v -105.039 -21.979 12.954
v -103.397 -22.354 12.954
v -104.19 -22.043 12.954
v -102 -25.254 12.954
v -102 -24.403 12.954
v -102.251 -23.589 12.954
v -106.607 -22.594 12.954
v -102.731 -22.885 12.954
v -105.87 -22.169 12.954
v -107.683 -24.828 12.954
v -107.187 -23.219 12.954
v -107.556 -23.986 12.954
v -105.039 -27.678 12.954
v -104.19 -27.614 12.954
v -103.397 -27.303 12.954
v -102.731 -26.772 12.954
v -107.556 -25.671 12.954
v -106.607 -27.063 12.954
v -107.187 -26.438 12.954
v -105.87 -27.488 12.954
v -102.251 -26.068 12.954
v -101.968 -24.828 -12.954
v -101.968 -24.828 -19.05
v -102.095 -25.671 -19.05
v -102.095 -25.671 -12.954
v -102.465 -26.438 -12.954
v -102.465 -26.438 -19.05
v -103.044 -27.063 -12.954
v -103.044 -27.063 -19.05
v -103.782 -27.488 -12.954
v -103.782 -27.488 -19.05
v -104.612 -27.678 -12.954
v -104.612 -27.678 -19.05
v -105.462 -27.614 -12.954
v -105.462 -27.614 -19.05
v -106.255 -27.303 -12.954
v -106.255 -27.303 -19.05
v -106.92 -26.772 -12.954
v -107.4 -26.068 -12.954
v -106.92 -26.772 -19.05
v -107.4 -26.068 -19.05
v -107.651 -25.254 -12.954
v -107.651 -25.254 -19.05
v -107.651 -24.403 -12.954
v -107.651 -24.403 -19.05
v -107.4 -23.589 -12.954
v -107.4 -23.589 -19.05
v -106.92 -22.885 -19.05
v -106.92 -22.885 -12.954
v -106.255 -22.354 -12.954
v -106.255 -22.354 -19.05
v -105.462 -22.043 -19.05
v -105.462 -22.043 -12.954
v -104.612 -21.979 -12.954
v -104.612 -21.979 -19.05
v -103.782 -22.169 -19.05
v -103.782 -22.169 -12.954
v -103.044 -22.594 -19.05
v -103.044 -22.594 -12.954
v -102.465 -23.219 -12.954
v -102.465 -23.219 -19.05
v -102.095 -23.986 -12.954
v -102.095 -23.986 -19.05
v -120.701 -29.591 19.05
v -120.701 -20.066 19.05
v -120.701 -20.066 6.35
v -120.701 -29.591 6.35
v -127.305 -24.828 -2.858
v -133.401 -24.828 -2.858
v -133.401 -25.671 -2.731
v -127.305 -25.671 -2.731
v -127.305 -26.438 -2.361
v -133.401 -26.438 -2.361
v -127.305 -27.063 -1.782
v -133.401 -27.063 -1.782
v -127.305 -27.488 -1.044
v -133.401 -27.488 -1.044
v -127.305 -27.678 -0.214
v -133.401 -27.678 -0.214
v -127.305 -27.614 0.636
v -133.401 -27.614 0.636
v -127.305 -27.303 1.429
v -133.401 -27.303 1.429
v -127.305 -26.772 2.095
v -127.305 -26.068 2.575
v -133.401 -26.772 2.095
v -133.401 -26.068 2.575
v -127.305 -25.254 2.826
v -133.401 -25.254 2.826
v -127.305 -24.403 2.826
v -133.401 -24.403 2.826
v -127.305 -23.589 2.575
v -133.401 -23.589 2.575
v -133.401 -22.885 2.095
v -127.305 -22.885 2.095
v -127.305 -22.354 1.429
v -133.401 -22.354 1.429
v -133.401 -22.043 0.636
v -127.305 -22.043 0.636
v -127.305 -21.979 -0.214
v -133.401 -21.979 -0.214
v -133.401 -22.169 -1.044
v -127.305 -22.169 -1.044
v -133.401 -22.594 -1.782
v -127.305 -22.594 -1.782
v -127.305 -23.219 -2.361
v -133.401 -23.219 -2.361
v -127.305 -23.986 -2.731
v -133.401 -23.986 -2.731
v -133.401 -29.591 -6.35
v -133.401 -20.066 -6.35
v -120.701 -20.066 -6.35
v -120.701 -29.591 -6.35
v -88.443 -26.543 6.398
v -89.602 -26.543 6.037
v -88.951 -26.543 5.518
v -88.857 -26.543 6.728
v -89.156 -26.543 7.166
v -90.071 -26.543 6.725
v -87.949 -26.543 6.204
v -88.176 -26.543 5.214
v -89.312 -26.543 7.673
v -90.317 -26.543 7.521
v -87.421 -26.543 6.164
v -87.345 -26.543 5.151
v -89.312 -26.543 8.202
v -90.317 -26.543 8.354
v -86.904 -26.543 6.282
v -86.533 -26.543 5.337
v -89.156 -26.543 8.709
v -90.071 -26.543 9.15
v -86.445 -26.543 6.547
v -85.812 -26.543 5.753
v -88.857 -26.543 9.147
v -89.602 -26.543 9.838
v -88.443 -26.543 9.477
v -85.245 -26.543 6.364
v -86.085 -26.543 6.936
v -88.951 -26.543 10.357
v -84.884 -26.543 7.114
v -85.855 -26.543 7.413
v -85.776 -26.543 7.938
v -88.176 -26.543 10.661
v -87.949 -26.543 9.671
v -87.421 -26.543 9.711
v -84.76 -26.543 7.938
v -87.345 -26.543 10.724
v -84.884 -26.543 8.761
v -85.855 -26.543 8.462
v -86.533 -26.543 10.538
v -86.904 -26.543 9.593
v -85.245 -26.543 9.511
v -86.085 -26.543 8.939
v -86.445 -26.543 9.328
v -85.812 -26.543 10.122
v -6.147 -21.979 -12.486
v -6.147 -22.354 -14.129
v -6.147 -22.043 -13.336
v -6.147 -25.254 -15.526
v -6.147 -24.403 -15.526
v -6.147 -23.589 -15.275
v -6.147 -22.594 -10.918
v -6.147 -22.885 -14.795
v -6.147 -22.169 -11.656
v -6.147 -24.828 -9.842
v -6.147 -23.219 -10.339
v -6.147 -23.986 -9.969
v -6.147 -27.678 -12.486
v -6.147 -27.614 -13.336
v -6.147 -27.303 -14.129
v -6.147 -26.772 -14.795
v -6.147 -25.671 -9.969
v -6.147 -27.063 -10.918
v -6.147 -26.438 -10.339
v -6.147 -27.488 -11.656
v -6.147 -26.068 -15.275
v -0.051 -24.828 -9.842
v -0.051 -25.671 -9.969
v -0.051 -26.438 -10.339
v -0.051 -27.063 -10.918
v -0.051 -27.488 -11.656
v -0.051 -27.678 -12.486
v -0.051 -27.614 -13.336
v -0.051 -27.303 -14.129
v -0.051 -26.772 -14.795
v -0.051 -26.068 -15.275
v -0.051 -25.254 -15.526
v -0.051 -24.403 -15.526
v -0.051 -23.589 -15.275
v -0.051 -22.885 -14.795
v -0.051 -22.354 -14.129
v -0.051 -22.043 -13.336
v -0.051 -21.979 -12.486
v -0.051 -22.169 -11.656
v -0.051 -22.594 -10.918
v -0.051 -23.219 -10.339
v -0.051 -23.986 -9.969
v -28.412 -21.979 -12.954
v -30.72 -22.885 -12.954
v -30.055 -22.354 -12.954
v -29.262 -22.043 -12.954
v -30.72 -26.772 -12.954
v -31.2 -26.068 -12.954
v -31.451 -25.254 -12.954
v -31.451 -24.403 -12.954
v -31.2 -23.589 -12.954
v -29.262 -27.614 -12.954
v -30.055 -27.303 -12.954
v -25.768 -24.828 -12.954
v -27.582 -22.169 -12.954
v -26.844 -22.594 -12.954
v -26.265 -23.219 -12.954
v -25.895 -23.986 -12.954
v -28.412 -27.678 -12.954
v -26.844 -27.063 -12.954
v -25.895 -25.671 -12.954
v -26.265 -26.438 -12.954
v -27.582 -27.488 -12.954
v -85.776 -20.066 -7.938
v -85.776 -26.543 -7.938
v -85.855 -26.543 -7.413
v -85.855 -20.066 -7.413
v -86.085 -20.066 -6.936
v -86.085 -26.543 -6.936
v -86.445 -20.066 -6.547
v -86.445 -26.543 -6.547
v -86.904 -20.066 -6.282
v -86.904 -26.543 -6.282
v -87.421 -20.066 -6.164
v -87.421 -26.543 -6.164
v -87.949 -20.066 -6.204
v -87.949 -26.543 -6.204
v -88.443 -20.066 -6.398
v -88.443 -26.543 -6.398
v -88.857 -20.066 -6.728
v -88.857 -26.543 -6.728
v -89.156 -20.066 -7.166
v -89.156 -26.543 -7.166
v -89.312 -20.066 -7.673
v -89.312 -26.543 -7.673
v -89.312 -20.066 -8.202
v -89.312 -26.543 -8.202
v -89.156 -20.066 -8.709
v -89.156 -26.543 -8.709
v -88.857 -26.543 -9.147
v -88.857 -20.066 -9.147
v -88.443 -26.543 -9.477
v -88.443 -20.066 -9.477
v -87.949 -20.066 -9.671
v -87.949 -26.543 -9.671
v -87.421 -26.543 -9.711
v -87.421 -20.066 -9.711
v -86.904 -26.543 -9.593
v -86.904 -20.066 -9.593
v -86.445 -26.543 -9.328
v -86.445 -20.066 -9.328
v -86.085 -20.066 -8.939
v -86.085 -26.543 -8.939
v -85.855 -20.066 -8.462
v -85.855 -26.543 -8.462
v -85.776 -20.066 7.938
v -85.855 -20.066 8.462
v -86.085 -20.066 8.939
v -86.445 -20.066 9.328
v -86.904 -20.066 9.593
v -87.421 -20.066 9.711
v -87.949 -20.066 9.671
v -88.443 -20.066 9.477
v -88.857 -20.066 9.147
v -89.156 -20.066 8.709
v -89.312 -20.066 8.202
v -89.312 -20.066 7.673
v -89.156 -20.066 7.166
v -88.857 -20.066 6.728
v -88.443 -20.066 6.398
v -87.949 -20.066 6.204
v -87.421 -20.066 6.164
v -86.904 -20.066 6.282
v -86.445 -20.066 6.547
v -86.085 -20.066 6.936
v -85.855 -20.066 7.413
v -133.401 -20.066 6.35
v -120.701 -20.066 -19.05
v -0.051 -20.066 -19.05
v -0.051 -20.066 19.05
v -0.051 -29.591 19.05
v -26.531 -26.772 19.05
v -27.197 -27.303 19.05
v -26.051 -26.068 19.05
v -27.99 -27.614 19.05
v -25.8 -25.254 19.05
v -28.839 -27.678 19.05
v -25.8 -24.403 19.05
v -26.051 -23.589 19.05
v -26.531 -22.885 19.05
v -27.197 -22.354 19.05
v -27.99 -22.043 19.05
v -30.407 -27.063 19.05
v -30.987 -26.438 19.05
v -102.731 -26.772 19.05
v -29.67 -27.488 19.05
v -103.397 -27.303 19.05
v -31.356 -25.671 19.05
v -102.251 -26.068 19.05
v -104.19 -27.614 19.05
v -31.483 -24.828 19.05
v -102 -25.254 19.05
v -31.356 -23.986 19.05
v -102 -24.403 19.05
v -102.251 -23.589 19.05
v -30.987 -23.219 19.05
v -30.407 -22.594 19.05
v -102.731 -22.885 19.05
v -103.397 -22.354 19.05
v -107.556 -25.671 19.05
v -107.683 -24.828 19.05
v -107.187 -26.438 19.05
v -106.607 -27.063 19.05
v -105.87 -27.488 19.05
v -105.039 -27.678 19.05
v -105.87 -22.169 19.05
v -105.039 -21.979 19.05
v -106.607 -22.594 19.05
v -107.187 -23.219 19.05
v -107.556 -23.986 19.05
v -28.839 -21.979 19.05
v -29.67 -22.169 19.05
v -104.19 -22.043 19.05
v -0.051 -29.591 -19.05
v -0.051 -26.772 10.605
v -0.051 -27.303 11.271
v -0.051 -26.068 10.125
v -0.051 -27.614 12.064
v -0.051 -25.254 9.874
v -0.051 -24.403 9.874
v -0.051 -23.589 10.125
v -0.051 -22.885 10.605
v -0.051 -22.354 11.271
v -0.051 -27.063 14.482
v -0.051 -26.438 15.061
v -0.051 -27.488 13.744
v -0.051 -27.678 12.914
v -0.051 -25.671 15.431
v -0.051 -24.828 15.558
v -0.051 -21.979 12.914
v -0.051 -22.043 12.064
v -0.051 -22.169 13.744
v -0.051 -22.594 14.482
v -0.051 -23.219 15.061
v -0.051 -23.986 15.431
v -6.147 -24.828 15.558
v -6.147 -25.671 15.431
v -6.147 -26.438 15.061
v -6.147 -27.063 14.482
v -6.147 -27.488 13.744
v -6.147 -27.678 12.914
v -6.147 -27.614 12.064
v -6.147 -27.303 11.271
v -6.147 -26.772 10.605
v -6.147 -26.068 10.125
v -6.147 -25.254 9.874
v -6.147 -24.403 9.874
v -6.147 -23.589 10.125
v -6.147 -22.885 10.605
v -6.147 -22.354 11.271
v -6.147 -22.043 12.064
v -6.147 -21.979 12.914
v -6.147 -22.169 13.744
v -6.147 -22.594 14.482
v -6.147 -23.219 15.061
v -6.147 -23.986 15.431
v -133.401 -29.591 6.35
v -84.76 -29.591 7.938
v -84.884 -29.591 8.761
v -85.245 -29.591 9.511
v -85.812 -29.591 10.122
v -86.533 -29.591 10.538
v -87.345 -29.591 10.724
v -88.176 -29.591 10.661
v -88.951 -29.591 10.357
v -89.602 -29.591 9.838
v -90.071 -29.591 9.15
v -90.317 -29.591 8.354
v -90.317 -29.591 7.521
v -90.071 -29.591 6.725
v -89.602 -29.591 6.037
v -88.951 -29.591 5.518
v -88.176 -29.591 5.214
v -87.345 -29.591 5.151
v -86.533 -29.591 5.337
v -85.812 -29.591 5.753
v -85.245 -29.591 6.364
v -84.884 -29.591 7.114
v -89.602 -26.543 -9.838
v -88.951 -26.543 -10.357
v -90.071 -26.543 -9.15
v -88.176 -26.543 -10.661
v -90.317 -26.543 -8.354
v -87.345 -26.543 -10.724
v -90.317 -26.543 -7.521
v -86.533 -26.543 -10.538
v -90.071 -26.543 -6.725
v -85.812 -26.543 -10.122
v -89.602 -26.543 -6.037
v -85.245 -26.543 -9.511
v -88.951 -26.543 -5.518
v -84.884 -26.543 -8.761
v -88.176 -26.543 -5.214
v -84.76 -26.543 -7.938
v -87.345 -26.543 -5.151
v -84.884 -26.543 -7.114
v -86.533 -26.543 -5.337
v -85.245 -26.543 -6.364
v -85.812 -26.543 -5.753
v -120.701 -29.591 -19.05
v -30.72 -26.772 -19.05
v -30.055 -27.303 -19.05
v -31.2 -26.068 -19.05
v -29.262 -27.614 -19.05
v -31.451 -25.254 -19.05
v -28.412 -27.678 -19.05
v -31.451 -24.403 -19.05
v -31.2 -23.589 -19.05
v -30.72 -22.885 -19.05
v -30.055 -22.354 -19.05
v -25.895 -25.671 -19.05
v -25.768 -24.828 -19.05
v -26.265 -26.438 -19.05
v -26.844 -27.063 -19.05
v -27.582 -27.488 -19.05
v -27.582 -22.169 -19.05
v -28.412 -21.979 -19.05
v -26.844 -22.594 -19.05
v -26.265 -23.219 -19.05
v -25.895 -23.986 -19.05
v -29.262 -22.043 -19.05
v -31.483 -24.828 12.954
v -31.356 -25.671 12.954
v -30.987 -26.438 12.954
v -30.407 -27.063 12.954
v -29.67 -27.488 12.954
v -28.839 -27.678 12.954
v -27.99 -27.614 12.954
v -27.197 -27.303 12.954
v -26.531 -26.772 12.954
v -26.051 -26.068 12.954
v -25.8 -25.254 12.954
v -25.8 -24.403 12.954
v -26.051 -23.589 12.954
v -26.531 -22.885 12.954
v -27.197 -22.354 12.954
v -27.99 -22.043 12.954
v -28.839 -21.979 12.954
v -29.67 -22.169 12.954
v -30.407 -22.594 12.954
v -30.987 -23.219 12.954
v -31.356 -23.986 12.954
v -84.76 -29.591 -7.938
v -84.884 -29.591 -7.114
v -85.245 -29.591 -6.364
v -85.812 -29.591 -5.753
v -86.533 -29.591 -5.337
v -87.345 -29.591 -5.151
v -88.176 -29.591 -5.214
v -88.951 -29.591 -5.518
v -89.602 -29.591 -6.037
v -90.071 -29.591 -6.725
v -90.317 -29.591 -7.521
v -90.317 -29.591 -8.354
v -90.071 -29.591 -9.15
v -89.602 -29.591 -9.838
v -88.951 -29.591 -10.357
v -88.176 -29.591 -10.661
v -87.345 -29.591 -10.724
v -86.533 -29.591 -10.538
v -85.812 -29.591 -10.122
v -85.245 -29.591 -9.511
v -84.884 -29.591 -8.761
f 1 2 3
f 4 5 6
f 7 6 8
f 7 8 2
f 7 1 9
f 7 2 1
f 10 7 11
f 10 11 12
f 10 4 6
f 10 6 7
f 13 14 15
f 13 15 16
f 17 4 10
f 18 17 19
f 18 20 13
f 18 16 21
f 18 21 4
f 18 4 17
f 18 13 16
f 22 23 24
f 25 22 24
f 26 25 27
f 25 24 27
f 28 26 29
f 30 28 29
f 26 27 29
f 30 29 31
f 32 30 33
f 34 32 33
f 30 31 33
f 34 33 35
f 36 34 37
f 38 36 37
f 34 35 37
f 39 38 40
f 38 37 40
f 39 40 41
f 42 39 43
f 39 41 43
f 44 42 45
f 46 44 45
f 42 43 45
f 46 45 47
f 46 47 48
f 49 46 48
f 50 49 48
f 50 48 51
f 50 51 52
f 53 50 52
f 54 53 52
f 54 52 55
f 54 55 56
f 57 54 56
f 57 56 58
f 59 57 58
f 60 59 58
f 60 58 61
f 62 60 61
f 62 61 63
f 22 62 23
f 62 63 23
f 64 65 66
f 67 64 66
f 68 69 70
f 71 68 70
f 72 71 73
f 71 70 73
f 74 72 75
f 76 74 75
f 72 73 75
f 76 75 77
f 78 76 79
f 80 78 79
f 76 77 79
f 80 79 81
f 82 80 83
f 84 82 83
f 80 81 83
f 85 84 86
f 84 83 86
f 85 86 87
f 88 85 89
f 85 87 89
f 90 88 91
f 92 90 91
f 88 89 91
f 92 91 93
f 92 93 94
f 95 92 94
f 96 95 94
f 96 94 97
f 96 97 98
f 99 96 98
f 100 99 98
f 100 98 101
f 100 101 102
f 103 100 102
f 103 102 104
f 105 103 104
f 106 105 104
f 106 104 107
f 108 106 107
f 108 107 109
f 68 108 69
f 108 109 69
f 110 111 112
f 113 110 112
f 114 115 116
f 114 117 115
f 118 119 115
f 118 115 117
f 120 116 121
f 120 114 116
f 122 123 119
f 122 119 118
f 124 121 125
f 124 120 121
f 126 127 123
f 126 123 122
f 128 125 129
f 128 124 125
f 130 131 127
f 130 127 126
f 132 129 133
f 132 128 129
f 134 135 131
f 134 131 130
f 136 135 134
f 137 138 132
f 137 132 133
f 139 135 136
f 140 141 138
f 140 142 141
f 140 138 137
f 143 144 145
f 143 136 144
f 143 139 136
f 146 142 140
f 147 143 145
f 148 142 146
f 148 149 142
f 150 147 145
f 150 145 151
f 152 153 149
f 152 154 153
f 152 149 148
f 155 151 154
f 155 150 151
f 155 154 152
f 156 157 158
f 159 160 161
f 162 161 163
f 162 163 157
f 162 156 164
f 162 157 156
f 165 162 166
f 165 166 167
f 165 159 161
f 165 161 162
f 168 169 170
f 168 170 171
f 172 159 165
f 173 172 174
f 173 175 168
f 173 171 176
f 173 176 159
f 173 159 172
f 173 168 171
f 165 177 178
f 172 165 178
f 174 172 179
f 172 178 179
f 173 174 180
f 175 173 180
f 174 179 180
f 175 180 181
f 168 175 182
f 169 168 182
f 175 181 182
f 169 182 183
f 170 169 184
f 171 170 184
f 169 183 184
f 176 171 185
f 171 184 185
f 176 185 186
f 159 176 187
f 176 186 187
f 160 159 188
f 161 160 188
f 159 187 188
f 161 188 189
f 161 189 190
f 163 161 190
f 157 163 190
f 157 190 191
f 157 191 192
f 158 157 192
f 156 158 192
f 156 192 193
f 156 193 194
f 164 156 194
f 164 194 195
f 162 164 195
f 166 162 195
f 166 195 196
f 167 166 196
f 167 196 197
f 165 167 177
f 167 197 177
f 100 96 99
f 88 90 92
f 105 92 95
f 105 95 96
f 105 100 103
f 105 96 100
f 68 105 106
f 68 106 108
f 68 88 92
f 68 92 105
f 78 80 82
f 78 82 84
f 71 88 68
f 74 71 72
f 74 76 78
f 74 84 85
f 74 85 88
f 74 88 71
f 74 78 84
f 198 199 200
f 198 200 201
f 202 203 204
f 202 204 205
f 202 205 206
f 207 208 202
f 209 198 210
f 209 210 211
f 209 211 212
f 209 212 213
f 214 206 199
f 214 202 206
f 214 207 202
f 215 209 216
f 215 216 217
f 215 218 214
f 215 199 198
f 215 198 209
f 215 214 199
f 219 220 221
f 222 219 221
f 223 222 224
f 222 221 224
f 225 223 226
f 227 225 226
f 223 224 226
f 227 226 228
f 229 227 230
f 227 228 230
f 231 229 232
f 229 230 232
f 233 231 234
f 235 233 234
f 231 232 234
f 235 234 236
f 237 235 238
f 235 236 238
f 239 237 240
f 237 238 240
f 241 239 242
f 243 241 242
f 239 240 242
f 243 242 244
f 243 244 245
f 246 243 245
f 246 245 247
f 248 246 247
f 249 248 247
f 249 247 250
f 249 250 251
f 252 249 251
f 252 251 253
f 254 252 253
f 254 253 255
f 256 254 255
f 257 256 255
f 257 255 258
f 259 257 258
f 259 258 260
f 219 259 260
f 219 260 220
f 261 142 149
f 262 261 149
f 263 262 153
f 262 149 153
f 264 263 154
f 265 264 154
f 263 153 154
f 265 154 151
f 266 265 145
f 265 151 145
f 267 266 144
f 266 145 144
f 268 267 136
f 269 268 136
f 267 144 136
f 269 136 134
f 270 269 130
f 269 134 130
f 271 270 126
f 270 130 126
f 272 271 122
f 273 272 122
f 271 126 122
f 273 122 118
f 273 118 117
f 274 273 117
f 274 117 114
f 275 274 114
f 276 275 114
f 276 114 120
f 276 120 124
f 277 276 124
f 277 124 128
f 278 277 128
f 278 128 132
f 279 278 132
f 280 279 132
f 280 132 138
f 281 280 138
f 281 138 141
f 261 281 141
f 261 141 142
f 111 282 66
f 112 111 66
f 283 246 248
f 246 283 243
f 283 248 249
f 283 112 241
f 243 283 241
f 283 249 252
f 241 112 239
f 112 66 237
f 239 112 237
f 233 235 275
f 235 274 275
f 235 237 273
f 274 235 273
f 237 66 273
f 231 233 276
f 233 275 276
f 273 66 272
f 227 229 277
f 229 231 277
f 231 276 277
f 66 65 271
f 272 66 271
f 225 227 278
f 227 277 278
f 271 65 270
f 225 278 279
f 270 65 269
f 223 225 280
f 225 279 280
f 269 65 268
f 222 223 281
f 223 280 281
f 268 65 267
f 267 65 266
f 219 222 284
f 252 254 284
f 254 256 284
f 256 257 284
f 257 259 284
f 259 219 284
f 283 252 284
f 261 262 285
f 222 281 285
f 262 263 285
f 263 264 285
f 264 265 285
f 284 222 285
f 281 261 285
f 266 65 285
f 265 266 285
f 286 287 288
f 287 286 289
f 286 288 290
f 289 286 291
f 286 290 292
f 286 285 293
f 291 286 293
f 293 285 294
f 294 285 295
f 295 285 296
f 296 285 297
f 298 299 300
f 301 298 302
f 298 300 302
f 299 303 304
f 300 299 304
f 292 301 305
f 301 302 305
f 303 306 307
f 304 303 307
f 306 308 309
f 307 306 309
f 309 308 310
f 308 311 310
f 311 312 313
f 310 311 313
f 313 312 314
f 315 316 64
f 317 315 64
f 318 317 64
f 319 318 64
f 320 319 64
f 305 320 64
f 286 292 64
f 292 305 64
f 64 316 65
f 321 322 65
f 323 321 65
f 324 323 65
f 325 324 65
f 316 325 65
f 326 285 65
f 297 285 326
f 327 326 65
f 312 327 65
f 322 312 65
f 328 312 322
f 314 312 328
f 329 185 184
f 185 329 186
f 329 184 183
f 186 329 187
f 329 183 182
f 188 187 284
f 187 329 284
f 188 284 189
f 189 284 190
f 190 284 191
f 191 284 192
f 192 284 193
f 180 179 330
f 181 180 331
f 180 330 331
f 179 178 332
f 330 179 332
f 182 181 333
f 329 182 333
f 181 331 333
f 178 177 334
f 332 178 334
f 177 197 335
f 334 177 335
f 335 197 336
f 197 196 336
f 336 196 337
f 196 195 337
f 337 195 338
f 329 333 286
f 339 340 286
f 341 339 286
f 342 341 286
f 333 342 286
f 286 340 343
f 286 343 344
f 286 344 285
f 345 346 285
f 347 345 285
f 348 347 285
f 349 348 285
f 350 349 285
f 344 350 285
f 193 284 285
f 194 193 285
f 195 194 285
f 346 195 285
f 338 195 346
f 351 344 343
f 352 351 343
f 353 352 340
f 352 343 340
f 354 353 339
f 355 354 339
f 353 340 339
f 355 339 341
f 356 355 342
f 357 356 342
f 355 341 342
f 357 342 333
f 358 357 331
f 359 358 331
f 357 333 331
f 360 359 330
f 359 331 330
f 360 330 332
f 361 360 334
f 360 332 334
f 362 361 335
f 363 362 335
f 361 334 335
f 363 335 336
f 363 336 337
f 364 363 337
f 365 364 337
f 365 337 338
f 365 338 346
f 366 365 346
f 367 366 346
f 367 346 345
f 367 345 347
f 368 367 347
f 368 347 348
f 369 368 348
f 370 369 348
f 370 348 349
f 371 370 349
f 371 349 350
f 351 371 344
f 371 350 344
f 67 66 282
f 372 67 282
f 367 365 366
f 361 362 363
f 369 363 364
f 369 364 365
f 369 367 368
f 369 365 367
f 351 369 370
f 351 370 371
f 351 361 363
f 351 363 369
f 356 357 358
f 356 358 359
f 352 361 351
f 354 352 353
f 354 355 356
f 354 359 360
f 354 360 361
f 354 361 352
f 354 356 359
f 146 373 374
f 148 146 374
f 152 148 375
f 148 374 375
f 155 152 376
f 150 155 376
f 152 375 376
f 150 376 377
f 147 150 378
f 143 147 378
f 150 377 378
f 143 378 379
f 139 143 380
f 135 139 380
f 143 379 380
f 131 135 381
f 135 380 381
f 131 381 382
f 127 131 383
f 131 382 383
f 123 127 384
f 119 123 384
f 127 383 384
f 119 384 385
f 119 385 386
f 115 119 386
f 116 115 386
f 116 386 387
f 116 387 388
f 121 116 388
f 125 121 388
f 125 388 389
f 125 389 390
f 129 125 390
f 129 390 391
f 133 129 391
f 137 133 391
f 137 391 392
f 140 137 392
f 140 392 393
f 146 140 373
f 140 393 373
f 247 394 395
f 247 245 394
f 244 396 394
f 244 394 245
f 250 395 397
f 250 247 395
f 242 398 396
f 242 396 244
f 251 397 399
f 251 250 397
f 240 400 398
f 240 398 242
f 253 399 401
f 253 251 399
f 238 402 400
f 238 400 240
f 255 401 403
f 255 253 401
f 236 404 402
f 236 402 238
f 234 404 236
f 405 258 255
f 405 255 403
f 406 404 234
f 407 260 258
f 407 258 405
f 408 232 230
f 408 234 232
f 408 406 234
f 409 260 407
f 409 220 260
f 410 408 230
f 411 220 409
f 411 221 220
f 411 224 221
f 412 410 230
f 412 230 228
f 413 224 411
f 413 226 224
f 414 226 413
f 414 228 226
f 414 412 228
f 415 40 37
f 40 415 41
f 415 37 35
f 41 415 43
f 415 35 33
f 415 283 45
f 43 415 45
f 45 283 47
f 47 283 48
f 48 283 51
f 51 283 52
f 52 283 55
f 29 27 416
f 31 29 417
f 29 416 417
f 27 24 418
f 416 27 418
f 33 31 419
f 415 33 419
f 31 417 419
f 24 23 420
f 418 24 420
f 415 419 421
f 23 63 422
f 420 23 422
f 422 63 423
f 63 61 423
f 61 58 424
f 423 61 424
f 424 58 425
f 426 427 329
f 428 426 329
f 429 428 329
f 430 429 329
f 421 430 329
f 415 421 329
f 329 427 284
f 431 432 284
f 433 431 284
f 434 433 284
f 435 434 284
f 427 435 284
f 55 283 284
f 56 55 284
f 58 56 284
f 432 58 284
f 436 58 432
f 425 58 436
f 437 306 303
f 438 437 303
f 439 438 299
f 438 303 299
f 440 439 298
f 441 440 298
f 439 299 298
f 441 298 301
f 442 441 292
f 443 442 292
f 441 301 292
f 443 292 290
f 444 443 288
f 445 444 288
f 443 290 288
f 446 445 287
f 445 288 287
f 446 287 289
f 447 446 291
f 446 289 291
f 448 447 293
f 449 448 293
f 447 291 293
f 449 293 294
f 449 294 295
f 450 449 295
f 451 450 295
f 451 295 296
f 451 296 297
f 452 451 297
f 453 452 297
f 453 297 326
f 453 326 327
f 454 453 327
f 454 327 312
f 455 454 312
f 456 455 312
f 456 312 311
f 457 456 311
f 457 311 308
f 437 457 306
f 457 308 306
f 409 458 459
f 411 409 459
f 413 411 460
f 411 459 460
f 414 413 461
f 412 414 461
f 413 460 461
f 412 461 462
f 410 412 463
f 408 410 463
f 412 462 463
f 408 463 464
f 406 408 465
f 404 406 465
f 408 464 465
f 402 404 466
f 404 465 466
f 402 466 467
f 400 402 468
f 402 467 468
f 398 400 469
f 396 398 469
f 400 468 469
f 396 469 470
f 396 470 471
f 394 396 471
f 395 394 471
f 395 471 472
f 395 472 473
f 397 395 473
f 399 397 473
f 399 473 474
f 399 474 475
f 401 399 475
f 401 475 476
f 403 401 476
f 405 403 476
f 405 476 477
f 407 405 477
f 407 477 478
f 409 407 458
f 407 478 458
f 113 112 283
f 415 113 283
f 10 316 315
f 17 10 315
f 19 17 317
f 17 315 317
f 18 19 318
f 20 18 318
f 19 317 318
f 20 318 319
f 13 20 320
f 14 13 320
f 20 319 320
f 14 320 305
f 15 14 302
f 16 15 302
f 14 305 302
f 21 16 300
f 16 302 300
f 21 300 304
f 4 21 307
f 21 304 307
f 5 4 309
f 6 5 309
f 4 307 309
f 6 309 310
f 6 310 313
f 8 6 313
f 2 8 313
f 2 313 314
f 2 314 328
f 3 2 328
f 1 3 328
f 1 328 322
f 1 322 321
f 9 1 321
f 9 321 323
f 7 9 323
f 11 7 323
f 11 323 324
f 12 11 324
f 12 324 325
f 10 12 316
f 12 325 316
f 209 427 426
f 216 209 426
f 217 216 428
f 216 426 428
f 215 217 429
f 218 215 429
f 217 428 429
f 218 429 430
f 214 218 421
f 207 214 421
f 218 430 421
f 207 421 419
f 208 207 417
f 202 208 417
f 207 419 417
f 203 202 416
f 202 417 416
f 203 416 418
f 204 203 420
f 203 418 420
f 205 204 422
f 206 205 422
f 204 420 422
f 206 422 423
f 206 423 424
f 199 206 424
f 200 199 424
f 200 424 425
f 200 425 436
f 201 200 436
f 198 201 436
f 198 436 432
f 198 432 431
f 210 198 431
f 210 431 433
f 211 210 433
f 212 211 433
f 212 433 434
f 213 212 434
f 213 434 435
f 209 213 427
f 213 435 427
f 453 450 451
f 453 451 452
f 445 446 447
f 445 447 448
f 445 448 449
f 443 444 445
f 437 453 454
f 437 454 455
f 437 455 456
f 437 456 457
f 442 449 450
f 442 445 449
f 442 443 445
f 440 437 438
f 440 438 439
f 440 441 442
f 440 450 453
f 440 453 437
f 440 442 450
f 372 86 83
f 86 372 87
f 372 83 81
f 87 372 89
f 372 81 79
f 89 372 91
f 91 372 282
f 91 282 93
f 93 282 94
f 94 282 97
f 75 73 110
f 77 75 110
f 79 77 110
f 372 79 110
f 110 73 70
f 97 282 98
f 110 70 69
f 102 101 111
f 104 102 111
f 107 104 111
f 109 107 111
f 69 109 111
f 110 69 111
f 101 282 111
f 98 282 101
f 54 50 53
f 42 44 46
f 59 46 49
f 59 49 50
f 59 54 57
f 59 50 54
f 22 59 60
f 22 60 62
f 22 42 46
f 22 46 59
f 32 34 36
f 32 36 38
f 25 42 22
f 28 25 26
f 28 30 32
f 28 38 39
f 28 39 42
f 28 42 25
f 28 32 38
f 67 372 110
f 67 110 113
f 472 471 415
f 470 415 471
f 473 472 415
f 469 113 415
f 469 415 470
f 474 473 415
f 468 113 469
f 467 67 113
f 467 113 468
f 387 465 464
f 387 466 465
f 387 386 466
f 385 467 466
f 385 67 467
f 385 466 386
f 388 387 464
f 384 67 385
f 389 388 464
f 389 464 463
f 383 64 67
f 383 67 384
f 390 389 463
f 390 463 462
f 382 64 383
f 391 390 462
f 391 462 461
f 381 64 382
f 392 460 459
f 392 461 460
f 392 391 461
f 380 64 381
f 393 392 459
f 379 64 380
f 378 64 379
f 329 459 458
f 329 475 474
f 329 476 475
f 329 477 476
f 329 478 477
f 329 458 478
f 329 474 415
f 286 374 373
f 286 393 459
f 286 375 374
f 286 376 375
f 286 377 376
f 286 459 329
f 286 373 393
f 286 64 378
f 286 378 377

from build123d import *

# Parameters (mm, degrees)
PAD003_DEPTH    = 9.525
SKETCH090_R     = 2.8575
POCKET018_DEPTH = 6.096
SKETCH091_R     = 2.8575
POCKET019_DEPTH = 6.096
SKETCH092_R     = 2.8575
POCKET020_DEPTH = 6.096
SKETCH093_R     = 2.8575
POCKET021_DEPTH = 6.096
SKETCH111_R     = 1.778
POCKET035_DEPTH = 9.526
SKETCH112_R     = 2.794
POCKET036_DEPTH = 3.048


with BuildPart() as part:
    # Sketch005 → Pad003 (new body)
    with BuildSketch(Plane.XZ):
        Polygon((66.675, -19.05), (66.675, 19.05), (-53.975, 19.05), (-53.975, 6.35), (-66.675, 6.35), (-66.675, -6.35), (-53.975, -6.35), (-53.975, -19.05), align=None)
    extrude(amount=PAD003_DEPTH)

    # Sketch090 (on Face6 of Pad003) → Pocket018 (cut)
    with BuildSketch(Plane(origin=(0, 0, 19.05), x_dir=(-1, 0, 0), z_dir=(0, 0, 1))):
        with Locations((38.1, 4.7625)):
            Circle(SKETCH090_R)
        with Locations((-38.1, 4.7625)):
            Circle(SKETCH090_R)
    extrude(amount=-POCKET018_DEPTH, mode=Mode.SUBTRACT)

    # Sketch091 (on Face4 of Pad003) → Pocket019 (cut)
    with BuildSketch(Plane(origin=(0, 0, -19.05), x_dir=(1, 0, 0), z_dir=(0, 0, -1))):
        with Locations((38.1, 4.7625)):
            Circle(SKETCH091_R)
        with Locations((-38.1, 4.7625)):
            Circle(SKETCH091_R)
    extrude(amount=-POCKET019_DEPTH, mode=Mode.SUBTRACT)

    # Sketch092 (on Face9 of Pocket019) → Pocket020 (cut)
    with BuildSketch(Plane(origin=(66.675, 0, 0), x_dir=(0, 0, 1), z_dir=(1, 0, 0))):
        with Locations((12.7, 4.7625)):
            Circle(SKETCH092_R)
        with Locations((-12.7, 4.7625)):
            Circle(SKETCH092_R)
    extrude(amount=-POCKET020_DEPTH, mode=Mode.SUBTRACT)

    # Sketch093 (on Face1 of Pocket019) → Pocket021 (cut)
    with BuildSketch(Plane(origin=(-66.675, 0, 0), x_dir=(0, 0, -1), z_dir=(-1, 0, 0))):
        with Locations((0, 4.7625)):
            Circle(SKETCH093_R)
    extrude(amount=-POCKET021_DEPTH, mode=Mode.SUBTRACT)

    # Sketch111 (on Face4 of Pocket021) → Pocket035 (cut, through all)
    with BuildSketch(Plane.XZ.offset(9.525)):
        with Locations((-20.828, 7.9375)):
            Circle(SKETCH111_R)
        with Locations((-20.828, -7.9375)):
            Circle(SKETCH111_R)
    extrude(amount=-POCKET035_DEPTH, mode=Mode.SUBTRACT)

    # Sketch112 (on Face4 of Pocket035) → Pocket036 (cut)
    with BuildSketch(Plane.XZ.offset(9.525)):
        with Locations((-20.828, 7.9375)):
            Circle(SKETCH112_R)
        with Locations((-20.828, -7.9375)):
            Circle(SKETCH112_R)
    extrude(amount=-POCKET036_DEPTH, mode=Mode.SUBTRACT)


with BuildPart() as part_1:
    # Body003 placement: moved
    add(part.part.moved(Location((-66.7258, -20.066, 0))))


solid = part_1.part
